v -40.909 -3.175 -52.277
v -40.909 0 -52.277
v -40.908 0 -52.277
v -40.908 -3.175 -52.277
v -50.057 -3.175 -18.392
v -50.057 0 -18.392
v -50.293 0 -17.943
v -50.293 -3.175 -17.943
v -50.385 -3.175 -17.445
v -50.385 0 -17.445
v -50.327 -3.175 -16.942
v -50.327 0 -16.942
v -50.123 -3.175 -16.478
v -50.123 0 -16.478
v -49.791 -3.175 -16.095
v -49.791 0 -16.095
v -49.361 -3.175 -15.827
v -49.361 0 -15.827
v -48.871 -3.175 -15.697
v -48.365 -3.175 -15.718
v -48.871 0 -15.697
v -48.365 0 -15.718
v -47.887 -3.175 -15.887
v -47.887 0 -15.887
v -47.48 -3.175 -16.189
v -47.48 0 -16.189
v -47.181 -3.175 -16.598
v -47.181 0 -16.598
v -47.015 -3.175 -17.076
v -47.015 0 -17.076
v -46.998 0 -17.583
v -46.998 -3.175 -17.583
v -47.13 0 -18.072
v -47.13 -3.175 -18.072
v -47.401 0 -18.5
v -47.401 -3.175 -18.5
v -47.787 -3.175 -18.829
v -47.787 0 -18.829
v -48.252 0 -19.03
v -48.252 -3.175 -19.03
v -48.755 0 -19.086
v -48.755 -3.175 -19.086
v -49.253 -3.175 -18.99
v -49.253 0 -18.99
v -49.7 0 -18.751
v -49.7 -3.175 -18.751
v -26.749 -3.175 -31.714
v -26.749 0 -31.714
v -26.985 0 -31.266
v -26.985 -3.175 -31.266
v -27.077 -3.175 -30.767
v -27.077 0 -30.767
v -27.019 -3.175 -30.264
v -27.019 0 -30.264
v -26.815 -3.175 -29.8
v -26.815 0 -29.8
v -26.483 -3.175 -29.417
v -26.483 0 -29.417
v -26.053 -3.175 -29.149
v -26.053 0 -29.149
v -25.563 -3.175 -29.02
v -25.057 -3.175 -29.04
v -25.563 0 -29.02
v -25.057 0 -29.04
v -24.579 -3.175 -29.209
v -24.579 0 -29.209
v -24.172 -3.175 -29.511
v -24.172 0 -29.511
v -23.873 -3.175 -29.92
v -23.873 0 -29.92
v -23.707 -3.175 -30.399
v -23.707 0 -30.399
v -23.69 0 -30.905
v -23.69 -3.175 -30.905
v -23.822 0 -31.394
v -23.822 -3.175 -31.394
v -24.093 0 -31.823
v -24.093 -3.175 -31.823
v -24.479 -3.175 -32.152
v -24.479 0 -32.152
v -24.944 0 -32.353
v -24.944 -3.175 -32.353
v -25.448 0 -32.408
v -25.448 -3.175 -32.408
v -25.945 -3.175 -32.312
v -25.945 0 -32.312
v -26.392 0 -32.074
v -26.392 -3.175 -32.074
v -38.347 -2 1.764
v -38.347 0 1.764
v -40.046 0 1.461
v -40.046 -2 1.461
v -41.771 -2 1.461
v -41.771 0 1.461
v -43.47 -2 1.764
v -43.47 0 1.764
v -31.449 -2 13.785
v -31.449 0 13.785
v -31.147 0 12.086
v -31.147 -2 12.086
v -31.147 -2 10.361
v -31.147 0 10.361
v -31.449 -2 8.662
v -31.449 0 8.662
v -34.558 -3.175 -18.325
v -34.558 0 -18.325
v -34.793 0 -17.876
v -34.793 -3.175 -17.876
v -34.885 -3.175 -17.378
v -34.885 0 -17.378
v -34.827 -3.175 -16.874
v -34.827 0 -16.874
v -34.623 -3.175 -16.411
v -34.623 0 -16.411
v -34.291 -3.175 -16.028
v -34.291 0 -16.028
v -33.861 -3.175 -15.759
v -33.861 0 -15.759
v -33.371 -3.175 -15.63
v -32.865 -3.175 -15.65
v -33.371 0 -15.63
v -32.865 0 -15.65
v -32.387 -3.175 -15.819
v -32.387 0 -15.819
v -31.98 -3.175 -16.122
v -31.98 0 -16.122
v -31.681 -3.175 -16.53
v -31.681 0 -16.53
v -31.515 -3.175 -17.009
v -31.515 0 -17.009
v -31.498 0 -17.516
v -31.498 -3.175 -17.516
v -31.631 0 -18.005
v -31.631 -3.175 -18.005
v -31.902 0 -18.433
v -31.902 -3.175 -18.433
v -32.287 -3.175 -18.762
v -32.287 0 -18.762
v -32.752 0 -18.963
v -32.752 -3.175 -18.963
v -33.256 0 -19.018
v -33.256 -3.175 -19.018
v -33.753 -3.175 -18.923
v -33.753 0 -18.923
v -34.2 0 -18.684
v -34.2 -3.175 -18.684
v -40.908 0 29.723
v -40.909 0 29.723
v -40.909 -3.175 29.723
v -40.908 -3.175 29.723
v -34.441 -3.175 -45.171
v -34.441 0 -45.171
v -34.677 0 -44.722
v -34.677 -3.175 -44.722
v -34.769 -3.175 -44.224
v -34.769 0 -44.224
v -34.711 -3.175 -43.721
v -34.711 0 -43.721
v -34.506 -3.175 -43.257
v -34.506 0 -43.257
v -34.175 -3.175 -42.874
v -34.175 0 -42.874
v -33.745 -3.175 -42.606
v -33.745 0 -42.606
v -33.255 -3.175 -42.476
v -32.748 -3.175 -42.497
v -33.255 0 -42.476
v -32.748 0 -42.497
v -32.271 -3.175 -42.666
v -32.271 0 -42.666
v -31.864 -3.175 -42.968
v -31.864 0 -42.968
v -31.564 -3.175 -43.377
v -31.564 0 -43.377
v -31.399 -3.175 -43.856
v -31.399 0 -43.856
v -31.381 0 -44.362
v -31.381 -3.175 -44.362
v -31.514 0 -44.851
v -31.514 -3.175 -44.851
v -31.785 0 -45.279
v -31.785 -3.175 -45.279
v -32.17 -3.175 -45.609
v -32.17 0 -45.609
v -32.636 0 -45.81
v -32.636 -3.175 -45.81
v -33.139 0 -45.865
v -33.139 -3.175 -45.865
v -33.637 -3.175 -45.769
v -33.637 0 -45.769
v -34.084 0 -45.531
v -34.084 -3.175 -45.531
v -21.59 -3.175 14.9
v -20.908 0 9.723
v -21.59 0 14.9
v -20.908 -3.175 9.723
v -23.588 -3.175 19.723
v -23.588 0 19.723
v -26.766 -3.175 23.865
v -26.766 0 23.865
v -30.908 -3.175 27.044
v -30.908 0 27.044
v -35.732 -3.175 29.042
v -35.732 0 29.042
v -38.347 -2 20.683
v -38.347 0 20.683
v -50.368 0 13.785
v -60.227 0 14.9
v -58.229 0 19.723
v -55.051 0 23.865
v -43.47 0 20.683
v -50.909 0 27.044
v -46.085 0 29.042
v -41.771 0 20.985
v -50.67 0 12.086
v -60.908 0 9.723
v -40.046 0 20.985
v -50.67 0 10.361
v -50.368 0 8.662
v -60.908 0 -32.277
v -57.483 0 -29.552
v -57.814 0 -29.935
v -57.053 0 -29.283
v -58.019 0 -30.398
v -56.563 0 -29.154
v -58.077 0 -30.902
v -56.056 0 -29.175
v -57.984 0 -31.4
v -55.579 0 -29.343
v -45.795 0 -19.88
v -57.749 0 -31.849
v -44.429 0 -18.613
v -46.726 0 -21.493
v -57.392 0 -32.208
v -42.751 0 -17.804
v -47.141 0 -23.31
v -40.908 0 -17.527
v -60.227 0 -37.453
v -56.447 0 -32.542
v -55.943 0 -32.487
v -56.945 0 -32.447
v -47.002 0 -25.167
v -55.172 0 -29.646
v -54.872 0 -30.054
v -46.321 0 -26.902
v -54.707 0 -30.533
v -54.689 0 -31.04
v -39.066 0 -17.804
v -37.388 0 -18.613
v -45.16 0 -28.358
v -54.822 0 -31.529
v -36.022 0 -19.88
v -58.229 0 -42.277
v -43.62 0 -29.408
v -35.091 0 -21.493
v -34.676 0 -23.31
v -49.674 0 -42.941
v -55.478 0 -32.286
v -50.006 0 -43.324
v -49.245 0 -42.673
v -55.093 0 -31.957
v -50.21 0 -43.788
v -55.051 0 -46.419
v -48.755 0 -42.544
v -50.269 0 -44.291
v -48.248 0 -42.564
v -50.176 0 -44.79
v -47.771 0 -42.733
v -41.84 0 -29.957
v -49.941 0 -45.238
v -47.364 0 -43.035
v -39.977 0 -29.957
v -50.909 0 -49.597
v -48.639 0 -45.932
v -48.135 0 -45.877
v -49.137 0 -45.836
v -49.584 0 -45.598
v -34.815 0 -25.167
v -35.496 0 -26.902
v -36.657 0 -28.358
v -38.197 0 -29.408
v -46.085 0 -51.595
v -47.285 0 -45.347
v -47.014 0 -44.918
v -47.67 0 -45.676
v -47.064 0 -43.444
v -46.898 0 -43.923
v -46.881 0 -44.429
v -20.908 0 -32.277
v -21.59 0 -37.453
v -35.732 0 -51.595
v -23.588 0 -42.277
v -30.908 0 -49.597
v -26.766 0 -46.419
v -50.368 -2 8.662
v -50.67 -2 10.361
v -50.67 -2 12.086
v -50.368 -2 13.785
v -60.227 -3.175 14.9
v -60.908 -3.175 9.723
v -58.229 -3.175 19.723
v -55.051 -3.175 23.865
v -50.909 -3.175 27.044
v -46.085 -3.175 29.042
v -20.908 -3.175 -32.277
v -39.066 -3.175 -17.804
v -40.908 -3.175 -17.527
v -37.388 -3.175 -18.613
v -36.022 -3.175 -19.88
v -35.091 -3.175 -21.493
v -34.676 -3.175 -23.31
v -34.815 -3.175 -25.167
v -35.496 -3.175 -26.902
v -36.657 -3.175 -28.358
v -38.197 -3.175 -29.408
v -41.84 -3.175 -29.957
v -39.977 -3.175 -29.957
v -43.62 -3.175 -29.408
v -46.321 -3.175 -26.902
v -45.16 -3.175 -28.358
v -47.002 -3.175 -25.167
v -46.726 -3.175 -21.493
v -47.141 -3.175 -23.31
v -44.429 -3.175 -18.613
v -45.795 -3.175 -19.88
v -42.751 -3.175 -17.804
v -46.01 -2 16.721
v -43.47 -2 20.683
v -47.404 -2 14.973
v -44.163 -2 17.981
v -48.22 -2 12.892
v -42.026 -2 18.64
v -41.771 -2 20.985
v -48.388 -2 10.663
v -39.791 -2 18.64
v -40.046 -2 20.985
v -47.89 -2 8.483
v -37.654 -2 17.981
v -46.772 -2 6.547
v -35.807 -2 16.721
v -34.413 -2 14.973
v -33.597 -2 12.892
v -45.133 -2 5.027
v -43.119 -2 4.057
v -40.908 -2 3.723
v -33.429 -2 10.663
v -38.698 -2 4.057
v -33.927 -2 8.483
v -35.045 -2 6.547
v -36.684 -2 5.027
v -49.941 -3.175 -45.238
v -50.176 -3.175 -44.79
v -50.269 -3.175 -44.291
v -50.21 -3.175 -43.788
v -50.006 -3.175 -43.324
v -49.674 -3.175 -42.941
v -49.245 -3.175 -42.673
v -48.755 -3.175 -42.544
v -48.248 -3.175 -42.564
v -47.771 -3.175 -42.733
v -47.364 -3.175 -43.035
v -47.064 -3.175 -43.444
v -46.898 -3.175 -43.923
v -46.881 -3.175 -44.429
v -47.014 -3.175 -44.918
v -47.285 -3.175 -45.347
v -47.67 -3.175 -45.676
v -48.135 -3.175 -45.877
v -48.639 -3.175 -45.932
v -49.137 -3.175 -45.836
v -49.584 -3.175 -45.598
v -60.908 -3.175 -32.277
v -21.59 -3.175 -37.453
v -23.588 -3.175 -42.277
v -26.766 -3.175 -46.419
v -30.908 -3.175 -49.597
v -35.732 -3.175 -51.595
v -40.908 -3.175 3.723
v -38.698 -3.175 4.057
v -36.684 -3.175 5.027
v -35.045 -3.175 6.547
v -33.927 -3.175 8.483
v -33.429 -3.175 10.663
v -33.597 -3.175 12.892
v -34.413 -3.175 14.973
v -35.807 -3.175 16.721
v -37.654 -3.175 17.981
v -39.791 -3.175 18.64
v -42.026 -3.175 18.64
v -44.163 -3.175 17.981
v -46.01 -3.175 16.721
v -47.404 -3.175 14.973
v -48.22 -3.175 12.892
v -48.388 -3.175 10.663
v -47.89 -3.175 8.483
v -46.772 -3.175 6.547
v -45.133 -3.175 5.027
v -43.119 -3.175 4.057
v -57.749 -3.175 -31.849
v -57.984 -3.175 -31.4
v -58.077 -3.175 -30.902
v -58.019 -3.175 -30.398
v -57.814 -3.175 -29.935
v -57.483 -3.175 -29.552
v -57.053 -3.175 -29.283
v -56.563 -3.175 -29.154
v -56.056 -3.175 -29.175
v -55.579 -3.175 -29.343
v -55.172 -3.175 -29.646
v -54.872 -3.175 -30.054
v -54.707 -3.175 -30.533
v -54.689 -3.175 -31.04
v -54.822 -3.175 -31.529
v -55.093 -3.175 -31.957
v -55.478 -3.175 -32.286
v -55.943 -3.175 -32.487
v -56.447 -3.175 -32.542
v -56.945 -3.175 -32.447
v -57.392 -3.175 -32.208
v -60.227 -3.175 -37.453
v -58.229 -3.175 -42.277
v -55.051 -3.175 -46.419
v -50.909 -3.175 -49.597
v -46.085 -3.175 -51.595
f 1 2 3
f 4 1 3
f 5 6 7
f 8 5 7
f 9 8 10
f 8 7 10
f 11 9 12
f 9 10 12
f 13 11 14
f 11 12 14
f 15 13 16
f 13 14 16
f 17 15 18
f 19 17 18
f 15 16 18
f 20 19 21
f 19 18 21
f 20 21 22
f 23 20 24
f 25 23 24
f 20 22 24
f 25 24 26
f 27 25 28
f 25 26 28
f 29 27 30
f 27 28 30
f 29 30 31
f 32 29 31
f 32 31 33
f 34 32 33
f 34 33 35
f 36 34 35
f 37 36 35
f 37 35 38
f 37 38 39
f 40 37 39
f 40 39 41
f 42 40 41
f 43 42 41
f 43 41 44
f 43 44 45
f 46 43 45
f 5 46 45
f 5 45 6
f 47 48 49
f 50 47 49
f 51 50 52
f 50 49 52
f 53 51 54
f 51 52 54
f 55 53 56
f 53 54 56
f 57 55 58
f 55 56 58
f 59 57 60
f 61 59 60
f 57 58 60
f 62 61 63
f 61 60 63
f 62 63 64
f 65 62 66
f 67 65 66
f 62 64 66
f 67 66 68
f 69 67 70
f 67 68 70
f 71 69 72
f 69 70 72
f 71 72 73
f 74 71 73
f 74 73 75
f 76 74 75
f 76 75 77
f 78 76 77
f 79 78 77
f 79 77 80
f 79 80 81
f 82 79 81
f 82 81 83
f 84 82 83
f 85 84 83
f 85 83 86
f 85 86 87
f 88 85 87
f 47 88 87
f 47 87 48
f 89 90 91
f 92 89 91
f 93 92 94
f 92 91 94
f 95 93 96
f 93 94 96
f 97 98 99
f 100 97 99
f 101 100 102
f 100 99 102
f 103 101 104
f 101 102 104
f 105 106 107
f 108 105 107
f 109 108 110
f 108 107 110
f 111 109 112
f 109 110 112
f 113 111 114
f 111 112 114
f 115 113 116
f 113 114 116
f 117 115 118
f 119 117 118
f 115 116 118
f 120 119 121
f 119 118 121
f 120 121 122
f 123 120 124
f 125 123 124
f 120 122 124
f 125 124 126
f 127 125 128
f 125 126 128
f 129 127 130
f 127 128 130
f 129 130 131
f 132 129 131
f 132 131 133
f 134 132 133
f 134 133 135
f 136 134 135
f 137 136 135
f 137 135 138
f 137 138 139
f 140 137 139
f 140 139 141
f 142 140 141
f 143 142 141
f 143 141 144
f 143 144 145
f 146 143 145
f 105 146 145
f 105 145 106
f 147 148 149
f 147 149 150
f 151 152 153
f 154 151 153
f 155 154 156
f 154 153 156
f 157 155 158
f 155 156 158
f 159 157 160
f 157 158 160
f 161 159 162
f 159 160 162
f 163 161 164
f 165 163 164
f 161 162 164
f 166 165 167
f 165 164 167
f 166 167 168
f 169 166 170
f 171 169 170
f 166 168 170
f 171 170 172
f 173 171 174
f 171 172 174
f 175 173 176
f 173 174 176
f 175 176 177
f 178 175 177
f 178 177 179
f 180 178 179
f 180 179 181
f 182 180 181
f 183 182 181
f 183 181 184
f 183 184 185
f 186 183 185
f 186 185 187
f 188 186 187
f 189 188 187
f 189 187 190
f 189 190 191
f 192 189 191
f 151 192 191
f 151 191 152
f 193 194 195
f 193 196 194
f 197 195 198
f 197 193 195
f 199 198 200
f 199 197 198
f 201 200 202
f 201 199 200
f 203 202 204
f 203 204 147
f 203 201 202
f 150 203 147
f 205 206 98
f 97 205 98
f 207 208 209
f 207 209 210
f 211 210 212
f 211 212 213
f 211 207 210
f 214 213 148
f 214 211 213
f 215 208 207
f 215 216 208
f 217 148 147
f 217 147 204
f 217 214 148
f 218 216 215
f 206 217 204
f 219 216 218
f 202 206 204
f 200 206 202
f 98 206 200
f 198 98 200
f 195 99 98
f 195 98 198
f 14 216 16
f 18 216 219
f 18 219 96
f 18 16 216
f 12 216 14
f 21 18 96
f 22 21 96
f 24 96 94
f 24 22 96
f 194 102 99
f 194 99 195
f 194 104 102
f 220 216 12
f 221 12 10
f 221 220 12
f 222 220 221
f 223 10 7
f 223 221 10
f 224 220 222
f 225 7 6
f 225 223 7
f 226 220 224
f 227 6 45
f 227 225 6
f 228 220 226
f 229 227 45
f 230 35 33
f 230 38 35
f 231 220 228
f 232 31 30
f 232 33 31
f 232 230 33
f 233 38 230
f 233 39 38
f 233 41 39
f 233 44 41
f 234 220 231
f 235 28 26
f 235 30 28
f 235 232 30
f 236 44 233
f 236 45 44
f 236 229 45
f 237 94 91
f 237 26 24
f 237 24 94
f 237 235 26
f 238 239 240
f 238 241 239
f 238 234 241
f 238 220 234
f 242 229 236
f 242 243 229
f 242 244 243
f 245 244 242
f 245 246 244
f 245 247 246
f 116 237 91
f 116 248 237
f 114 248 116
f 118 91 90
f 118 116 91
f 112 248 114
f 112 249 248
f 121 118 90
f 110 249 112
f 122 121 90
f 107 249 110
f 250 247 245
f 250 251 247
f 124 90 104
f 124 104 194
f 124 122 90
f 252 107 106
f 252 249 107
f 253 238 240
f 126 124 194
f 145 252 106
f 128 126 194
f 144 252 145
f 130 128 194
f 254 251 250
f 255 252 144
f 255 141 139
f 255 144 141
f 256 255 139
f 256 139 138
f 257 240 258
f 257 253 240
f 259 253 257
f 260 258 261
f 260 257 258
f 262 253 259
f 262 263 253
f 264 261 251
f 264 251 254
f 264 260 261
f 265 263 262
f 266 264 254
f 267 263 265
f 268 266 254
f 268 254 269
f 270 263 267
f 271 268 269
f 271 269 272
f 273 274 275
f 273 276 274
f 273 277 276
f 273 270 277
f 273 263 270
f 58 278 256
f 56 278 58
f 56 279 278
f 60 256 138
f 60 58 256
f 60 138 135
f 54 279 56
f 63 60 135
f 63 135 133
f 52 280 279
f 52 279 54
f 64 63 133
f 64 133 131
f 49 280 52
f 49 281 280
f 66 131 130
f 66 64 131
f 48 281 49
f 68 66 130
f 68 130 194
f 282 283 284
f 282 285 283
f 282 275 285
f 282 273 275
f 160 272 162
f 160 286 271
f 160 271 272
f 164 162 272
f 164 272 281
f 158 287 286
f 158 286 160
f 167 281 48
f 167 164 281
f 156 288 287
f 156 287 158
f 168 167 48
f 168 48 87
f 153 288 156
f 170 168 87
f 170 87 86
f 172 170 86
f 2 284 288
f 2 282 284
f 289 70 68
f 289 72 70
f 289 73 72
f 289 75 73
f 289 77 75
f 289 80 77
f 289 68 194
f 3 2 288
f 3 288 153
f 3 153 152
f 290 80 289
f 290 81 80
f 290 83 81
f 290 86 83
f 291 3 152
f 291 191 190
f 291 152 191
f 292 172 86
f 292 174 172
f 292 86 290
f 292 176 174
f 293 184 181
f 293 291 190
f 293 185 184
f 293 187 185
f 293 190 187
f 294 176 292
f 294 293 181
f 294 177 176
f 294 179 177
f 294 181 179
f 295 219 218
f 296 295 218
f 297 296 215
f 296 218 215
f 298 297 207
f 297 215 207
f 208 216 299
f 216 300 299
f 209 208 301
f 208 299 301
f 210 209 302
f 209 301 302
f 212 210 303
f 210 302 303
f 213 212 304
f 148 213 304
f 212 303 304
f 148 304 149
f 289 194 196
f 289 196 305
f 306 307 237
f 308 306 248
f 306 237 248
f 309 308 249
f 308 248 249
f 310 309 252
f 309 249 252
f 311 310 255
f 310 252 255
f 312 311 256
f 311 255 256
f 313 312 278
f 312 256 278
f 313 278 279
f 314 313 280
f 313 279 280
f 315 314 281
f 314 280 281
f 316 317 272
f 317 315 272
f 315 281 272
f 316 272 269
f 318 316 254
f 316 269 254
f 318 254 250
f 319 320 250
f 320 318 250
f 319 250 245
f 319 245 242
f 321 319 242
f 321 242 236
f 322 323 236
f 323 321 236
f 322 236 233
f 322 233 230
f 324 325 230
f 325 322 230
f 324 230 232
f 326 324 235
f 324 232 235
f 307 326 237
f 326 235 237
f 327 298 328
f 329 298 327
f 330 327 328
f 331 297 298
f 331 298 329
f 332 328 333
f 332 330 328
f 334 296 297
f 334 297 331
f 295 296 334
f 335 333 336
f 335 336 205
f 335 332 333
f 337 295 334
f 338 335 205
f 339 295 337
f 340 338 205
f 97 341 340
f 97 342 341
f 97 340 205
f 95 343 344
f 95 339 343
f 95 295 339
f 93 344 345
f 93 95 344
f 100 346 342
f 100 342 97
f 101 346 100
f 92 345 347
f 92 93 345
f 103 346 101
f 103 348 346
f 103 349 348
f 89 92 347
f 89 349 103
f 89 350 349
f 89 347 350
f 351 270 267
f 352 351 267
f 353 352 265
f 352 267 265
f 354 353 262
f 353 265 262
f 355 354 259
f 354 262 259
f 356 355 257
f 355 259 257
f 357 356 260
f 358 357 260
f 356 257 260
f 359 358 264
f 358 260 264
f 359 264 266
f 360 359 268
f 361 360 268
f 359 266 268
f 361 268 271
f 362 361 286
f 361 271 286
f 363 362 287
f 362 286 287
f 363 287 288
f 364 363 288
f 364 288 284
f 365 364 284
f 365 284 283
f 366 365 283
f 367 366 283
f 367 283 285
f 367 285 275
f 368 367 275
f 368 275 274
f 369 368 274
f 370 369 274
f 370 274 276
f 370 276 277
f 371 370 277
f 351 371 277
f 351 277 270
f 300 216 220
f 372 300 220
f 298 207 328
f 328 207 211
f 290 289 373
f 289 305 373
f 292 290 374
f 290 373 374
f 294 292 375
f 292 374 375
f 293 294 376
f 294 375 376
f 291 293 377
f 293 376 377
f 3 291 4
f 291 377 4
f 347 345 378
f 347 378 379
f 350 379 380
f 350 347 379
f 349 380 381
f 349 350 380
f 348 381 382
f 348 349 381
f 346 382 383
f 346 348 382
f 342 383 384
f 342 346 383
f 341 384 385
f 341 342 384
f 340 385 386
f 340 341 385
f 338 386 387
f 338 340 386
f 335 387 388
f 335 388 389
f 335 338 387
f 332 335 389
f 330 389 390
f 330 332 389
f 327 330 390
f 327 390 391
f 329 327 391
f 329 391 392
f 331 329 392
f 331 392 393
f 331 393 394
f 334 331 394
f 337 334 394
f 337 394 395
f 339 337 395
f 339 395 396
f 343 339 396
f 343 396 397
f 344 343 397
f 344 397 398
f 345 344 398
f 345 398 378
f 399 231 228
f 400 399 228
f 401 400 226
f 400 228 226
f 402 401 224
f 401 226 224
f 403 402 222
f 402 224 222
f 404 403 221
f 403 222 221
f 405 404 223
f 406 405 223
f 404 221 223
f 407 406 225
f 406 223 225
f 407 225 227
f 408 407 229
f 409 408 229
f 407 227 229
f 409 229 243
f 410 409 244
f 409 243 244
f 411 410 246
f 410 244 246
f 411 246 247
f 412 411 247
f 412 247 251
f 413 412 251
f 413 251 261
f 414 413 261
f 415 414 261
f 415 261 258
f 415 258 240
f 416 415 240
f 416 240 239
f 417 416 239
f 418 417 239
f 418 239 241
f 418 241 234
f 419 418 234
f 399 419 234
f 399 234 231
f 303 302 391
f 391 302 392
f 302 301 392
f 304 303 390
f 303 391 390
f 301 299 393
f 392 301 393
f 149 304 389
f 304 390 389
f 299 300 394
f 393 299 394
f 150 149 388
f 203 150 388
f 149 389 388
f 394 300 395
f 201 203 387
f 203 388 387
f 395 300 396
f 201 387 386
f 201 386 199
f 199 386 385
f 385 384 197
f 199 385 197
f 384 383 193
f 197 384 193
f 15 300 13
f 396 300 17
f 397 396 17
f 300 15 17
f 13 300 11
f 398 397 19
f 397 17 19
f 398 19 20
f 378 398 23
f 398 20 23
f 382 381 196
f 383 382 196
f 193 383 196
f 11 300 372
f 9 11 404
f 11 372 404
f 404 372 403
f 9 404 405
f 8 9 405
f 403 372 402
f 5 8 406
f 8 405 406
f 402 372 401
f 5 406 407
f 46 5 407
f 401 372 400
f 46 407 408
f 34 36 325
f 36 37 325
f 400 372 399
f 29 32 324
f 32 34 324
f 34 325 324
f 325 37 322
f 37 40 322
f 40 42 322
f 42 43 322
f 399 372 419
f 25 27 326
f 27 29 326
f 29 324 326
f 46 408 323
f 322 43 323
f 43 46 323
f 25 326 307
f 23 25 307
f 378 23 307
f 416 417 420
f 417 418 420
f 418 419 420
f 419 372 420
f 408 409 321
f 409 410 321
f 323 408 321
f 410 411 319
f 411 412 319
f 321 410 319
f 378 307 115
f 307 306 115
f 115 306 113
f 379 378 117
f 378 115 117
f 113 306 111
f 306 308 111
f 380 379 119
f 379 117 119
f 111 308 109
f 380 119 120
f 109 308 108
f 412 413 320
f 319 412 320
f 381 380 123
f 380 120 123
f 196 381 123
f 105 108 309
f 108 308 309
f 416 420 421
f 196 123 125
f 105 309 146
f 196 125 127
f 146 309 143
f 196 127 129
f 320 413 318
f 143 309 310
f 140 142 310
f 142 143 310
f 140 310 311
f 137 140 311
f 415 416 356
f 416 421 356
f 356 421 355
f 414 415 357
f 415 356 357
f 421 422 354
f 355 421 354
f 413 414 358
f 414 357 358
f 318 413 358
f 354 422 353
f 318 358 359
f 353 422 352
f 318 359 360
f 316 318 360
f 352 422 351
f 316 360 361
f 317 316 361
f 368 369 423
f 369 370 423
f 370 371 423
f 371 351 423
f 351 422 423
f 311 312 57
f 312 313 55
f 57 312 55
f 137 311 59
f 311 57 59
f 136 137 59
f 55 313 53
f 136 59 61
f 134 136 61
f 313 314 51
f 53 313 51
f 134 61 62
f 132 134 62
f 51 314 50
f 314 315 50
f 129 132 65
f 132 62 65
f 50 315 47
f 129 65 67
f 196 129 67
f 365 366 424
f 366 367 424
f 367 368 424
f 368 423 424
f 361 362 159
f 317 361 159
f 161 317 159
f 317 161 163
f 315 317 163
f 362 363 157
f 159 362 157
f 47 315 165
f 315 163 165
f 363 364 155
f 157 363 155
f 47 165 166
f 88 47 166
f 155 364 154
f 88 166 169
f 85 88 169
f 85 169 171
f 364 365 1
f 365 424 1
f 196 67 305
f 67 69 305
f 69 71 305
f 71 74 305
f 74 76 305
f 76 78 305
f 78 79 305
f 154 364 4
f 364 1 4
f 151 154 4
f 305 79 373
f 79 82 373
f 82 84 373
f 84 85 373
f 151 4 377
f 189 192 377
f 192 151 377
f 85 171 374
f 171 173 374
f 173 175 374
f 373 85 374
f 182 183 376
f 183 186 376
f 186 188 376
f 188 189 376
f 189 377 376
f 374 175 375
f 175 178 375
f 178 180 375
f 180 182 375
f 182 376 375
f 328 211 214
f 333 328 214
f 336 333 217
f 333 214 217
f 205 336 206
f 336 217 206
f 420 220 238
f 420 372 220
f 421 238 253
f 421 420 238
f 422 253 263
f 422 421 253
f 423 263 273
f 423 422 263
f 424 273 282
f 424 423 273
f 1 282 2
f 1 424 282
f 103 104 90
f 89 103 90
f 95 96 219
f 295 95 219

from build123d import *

# Parameters (mm, degrees)
CROQUIS1_W                   = 40
CROQUIS1_H                   = 82
BRIDA_BASE1_DEPTH            = 3.175
CROQUIS6_R                   = 6.25
CORTAR_EXTRUIR17_DEPTH       = 2
CORTAR_EXTRUIR5_START        = -10
CROQUIS5_R                   = 7.5
CROQUIS5_R_2                 = 6.25
CORTAR_EXTRUIR5_DEPTH        = 10
REDONDEO1_R                  = 20
TALADRO_DE_MARGEN_PARA_M31_D = 3.4


# Sheet-metal steps are written as plain solids
with BuildPart() as part:
    # Croquis1 → Brida base1 (new body)
    with BuildSketch(Plane(origin=(0, 0, 0), x_dir=(1, 0, 0), z_dir=(0, 1, 0))):
        with Locations((-40.908481915, 11.276700353)):
            Rectangle(CROQUIS1_W, CROQUIS1_H)
    extrude(amount=-BRIDA_BASE1_DEPTH)

    # Croquis6 → Cortar-Extruir17 (cut)
    with BuildSketch(Plane(origin=(0, 0, 0), x_dir=(1, 0, 0), z_dir=(0, 1, 0))):
        with Locations(Location((-40.908481915, 23.776700353, 0), (0, 0, 270))):
            Circle(CROQUIS6_R)
        with BuildLine():
            Line((-43.469976683, -1.763979135), (-50.367802427, -8.661804879))
            ThreePointArc((-50.367802427, -8.661804879), (-50.708481915, -11.223299647), (-50.367802427, -13.784794415))
            Line((-50.367802427, -13.784794415), (-43.469976683, -20.682620159))
            ThreePointArc((-43.469976683, -20.682620159), (-40.908481915, -21.023299647), (-38.346987147, -20.682620159))
            Line((-38.346987147, -20.682620159), (-31.449161403, -13.784794415))
            ThreePointArc((-31.449161403, -13.784794415), (-31.108481915, -11.223299647), (-31.449161403, -8.661804879))
            Line((-31.449161403, -8.661804879), (-38.346987147, -1.763979135))
            ThreePointArc((-38.346987147, -1.763979135), (-40.908481915, -1.423299647), (-43.469976683, -1.763979135))
        make_face()
    extrude(amount=-CORTAR_EXTRUIR17_DEPTH, mode=Mode.SUBTRACT)

    # Croquis5 → Cortar-Extruir5 (cut)
    with BuildSketch(Plane.XZ.offset(3.175).offset(CORTAR_EXTRUIR5_START)):
        with Locations(Location((-40.908481915, 11.223299647, 0), (0, 0, 270))):
            Circle(CROQUIS5_R)
        with Locations(Location((-40.908481915, -23.776700353, 0), (0, 0, 90))):
            Circle(CROQUIS5_R_2)
    extrude(amount=CORTAR_EXTRUIR5_DEPTH, mode=Mode.SUBTRACT)

    # Redondeo1
    redondeo1_edges = [part.edges().sort_by_distance(p)[0] for p in [
        (-60.908481915, -1.5875, -52.276700353),
        (-20.908481915, -1.5875, -52.276700353),
        (-20.908481915, -1.5875, 29.723299647),
        (-60.908481915, -1.5875, 29.723299647),
    ]]
    fillet(redondeo1_edges, radius=REDONDEO1_R - 0.0001)  # a hair under: the kernel refuses the full size

    # Taladro de margen para M31 (through all)
    with Locations(Plane(origin=(-178.498967671, -3.175, 246.519317109), x_dir=(0.8065687193086877, 0, 0.59114033954108), z_dir=(0, -1, 0))):
        with Locations((-65.46157961, -295.903051669), (-67.078989392, -311.31843313), (-51.302762764, -289.596078899), (-54.537582329, -320.426841821), (-40.378765484, -314.119869051), (-38.761355701, -298.70448759)):
            Hole(TALADRO_DE_MARGEN_PARA_M31_D / 2)


solid = part.part
